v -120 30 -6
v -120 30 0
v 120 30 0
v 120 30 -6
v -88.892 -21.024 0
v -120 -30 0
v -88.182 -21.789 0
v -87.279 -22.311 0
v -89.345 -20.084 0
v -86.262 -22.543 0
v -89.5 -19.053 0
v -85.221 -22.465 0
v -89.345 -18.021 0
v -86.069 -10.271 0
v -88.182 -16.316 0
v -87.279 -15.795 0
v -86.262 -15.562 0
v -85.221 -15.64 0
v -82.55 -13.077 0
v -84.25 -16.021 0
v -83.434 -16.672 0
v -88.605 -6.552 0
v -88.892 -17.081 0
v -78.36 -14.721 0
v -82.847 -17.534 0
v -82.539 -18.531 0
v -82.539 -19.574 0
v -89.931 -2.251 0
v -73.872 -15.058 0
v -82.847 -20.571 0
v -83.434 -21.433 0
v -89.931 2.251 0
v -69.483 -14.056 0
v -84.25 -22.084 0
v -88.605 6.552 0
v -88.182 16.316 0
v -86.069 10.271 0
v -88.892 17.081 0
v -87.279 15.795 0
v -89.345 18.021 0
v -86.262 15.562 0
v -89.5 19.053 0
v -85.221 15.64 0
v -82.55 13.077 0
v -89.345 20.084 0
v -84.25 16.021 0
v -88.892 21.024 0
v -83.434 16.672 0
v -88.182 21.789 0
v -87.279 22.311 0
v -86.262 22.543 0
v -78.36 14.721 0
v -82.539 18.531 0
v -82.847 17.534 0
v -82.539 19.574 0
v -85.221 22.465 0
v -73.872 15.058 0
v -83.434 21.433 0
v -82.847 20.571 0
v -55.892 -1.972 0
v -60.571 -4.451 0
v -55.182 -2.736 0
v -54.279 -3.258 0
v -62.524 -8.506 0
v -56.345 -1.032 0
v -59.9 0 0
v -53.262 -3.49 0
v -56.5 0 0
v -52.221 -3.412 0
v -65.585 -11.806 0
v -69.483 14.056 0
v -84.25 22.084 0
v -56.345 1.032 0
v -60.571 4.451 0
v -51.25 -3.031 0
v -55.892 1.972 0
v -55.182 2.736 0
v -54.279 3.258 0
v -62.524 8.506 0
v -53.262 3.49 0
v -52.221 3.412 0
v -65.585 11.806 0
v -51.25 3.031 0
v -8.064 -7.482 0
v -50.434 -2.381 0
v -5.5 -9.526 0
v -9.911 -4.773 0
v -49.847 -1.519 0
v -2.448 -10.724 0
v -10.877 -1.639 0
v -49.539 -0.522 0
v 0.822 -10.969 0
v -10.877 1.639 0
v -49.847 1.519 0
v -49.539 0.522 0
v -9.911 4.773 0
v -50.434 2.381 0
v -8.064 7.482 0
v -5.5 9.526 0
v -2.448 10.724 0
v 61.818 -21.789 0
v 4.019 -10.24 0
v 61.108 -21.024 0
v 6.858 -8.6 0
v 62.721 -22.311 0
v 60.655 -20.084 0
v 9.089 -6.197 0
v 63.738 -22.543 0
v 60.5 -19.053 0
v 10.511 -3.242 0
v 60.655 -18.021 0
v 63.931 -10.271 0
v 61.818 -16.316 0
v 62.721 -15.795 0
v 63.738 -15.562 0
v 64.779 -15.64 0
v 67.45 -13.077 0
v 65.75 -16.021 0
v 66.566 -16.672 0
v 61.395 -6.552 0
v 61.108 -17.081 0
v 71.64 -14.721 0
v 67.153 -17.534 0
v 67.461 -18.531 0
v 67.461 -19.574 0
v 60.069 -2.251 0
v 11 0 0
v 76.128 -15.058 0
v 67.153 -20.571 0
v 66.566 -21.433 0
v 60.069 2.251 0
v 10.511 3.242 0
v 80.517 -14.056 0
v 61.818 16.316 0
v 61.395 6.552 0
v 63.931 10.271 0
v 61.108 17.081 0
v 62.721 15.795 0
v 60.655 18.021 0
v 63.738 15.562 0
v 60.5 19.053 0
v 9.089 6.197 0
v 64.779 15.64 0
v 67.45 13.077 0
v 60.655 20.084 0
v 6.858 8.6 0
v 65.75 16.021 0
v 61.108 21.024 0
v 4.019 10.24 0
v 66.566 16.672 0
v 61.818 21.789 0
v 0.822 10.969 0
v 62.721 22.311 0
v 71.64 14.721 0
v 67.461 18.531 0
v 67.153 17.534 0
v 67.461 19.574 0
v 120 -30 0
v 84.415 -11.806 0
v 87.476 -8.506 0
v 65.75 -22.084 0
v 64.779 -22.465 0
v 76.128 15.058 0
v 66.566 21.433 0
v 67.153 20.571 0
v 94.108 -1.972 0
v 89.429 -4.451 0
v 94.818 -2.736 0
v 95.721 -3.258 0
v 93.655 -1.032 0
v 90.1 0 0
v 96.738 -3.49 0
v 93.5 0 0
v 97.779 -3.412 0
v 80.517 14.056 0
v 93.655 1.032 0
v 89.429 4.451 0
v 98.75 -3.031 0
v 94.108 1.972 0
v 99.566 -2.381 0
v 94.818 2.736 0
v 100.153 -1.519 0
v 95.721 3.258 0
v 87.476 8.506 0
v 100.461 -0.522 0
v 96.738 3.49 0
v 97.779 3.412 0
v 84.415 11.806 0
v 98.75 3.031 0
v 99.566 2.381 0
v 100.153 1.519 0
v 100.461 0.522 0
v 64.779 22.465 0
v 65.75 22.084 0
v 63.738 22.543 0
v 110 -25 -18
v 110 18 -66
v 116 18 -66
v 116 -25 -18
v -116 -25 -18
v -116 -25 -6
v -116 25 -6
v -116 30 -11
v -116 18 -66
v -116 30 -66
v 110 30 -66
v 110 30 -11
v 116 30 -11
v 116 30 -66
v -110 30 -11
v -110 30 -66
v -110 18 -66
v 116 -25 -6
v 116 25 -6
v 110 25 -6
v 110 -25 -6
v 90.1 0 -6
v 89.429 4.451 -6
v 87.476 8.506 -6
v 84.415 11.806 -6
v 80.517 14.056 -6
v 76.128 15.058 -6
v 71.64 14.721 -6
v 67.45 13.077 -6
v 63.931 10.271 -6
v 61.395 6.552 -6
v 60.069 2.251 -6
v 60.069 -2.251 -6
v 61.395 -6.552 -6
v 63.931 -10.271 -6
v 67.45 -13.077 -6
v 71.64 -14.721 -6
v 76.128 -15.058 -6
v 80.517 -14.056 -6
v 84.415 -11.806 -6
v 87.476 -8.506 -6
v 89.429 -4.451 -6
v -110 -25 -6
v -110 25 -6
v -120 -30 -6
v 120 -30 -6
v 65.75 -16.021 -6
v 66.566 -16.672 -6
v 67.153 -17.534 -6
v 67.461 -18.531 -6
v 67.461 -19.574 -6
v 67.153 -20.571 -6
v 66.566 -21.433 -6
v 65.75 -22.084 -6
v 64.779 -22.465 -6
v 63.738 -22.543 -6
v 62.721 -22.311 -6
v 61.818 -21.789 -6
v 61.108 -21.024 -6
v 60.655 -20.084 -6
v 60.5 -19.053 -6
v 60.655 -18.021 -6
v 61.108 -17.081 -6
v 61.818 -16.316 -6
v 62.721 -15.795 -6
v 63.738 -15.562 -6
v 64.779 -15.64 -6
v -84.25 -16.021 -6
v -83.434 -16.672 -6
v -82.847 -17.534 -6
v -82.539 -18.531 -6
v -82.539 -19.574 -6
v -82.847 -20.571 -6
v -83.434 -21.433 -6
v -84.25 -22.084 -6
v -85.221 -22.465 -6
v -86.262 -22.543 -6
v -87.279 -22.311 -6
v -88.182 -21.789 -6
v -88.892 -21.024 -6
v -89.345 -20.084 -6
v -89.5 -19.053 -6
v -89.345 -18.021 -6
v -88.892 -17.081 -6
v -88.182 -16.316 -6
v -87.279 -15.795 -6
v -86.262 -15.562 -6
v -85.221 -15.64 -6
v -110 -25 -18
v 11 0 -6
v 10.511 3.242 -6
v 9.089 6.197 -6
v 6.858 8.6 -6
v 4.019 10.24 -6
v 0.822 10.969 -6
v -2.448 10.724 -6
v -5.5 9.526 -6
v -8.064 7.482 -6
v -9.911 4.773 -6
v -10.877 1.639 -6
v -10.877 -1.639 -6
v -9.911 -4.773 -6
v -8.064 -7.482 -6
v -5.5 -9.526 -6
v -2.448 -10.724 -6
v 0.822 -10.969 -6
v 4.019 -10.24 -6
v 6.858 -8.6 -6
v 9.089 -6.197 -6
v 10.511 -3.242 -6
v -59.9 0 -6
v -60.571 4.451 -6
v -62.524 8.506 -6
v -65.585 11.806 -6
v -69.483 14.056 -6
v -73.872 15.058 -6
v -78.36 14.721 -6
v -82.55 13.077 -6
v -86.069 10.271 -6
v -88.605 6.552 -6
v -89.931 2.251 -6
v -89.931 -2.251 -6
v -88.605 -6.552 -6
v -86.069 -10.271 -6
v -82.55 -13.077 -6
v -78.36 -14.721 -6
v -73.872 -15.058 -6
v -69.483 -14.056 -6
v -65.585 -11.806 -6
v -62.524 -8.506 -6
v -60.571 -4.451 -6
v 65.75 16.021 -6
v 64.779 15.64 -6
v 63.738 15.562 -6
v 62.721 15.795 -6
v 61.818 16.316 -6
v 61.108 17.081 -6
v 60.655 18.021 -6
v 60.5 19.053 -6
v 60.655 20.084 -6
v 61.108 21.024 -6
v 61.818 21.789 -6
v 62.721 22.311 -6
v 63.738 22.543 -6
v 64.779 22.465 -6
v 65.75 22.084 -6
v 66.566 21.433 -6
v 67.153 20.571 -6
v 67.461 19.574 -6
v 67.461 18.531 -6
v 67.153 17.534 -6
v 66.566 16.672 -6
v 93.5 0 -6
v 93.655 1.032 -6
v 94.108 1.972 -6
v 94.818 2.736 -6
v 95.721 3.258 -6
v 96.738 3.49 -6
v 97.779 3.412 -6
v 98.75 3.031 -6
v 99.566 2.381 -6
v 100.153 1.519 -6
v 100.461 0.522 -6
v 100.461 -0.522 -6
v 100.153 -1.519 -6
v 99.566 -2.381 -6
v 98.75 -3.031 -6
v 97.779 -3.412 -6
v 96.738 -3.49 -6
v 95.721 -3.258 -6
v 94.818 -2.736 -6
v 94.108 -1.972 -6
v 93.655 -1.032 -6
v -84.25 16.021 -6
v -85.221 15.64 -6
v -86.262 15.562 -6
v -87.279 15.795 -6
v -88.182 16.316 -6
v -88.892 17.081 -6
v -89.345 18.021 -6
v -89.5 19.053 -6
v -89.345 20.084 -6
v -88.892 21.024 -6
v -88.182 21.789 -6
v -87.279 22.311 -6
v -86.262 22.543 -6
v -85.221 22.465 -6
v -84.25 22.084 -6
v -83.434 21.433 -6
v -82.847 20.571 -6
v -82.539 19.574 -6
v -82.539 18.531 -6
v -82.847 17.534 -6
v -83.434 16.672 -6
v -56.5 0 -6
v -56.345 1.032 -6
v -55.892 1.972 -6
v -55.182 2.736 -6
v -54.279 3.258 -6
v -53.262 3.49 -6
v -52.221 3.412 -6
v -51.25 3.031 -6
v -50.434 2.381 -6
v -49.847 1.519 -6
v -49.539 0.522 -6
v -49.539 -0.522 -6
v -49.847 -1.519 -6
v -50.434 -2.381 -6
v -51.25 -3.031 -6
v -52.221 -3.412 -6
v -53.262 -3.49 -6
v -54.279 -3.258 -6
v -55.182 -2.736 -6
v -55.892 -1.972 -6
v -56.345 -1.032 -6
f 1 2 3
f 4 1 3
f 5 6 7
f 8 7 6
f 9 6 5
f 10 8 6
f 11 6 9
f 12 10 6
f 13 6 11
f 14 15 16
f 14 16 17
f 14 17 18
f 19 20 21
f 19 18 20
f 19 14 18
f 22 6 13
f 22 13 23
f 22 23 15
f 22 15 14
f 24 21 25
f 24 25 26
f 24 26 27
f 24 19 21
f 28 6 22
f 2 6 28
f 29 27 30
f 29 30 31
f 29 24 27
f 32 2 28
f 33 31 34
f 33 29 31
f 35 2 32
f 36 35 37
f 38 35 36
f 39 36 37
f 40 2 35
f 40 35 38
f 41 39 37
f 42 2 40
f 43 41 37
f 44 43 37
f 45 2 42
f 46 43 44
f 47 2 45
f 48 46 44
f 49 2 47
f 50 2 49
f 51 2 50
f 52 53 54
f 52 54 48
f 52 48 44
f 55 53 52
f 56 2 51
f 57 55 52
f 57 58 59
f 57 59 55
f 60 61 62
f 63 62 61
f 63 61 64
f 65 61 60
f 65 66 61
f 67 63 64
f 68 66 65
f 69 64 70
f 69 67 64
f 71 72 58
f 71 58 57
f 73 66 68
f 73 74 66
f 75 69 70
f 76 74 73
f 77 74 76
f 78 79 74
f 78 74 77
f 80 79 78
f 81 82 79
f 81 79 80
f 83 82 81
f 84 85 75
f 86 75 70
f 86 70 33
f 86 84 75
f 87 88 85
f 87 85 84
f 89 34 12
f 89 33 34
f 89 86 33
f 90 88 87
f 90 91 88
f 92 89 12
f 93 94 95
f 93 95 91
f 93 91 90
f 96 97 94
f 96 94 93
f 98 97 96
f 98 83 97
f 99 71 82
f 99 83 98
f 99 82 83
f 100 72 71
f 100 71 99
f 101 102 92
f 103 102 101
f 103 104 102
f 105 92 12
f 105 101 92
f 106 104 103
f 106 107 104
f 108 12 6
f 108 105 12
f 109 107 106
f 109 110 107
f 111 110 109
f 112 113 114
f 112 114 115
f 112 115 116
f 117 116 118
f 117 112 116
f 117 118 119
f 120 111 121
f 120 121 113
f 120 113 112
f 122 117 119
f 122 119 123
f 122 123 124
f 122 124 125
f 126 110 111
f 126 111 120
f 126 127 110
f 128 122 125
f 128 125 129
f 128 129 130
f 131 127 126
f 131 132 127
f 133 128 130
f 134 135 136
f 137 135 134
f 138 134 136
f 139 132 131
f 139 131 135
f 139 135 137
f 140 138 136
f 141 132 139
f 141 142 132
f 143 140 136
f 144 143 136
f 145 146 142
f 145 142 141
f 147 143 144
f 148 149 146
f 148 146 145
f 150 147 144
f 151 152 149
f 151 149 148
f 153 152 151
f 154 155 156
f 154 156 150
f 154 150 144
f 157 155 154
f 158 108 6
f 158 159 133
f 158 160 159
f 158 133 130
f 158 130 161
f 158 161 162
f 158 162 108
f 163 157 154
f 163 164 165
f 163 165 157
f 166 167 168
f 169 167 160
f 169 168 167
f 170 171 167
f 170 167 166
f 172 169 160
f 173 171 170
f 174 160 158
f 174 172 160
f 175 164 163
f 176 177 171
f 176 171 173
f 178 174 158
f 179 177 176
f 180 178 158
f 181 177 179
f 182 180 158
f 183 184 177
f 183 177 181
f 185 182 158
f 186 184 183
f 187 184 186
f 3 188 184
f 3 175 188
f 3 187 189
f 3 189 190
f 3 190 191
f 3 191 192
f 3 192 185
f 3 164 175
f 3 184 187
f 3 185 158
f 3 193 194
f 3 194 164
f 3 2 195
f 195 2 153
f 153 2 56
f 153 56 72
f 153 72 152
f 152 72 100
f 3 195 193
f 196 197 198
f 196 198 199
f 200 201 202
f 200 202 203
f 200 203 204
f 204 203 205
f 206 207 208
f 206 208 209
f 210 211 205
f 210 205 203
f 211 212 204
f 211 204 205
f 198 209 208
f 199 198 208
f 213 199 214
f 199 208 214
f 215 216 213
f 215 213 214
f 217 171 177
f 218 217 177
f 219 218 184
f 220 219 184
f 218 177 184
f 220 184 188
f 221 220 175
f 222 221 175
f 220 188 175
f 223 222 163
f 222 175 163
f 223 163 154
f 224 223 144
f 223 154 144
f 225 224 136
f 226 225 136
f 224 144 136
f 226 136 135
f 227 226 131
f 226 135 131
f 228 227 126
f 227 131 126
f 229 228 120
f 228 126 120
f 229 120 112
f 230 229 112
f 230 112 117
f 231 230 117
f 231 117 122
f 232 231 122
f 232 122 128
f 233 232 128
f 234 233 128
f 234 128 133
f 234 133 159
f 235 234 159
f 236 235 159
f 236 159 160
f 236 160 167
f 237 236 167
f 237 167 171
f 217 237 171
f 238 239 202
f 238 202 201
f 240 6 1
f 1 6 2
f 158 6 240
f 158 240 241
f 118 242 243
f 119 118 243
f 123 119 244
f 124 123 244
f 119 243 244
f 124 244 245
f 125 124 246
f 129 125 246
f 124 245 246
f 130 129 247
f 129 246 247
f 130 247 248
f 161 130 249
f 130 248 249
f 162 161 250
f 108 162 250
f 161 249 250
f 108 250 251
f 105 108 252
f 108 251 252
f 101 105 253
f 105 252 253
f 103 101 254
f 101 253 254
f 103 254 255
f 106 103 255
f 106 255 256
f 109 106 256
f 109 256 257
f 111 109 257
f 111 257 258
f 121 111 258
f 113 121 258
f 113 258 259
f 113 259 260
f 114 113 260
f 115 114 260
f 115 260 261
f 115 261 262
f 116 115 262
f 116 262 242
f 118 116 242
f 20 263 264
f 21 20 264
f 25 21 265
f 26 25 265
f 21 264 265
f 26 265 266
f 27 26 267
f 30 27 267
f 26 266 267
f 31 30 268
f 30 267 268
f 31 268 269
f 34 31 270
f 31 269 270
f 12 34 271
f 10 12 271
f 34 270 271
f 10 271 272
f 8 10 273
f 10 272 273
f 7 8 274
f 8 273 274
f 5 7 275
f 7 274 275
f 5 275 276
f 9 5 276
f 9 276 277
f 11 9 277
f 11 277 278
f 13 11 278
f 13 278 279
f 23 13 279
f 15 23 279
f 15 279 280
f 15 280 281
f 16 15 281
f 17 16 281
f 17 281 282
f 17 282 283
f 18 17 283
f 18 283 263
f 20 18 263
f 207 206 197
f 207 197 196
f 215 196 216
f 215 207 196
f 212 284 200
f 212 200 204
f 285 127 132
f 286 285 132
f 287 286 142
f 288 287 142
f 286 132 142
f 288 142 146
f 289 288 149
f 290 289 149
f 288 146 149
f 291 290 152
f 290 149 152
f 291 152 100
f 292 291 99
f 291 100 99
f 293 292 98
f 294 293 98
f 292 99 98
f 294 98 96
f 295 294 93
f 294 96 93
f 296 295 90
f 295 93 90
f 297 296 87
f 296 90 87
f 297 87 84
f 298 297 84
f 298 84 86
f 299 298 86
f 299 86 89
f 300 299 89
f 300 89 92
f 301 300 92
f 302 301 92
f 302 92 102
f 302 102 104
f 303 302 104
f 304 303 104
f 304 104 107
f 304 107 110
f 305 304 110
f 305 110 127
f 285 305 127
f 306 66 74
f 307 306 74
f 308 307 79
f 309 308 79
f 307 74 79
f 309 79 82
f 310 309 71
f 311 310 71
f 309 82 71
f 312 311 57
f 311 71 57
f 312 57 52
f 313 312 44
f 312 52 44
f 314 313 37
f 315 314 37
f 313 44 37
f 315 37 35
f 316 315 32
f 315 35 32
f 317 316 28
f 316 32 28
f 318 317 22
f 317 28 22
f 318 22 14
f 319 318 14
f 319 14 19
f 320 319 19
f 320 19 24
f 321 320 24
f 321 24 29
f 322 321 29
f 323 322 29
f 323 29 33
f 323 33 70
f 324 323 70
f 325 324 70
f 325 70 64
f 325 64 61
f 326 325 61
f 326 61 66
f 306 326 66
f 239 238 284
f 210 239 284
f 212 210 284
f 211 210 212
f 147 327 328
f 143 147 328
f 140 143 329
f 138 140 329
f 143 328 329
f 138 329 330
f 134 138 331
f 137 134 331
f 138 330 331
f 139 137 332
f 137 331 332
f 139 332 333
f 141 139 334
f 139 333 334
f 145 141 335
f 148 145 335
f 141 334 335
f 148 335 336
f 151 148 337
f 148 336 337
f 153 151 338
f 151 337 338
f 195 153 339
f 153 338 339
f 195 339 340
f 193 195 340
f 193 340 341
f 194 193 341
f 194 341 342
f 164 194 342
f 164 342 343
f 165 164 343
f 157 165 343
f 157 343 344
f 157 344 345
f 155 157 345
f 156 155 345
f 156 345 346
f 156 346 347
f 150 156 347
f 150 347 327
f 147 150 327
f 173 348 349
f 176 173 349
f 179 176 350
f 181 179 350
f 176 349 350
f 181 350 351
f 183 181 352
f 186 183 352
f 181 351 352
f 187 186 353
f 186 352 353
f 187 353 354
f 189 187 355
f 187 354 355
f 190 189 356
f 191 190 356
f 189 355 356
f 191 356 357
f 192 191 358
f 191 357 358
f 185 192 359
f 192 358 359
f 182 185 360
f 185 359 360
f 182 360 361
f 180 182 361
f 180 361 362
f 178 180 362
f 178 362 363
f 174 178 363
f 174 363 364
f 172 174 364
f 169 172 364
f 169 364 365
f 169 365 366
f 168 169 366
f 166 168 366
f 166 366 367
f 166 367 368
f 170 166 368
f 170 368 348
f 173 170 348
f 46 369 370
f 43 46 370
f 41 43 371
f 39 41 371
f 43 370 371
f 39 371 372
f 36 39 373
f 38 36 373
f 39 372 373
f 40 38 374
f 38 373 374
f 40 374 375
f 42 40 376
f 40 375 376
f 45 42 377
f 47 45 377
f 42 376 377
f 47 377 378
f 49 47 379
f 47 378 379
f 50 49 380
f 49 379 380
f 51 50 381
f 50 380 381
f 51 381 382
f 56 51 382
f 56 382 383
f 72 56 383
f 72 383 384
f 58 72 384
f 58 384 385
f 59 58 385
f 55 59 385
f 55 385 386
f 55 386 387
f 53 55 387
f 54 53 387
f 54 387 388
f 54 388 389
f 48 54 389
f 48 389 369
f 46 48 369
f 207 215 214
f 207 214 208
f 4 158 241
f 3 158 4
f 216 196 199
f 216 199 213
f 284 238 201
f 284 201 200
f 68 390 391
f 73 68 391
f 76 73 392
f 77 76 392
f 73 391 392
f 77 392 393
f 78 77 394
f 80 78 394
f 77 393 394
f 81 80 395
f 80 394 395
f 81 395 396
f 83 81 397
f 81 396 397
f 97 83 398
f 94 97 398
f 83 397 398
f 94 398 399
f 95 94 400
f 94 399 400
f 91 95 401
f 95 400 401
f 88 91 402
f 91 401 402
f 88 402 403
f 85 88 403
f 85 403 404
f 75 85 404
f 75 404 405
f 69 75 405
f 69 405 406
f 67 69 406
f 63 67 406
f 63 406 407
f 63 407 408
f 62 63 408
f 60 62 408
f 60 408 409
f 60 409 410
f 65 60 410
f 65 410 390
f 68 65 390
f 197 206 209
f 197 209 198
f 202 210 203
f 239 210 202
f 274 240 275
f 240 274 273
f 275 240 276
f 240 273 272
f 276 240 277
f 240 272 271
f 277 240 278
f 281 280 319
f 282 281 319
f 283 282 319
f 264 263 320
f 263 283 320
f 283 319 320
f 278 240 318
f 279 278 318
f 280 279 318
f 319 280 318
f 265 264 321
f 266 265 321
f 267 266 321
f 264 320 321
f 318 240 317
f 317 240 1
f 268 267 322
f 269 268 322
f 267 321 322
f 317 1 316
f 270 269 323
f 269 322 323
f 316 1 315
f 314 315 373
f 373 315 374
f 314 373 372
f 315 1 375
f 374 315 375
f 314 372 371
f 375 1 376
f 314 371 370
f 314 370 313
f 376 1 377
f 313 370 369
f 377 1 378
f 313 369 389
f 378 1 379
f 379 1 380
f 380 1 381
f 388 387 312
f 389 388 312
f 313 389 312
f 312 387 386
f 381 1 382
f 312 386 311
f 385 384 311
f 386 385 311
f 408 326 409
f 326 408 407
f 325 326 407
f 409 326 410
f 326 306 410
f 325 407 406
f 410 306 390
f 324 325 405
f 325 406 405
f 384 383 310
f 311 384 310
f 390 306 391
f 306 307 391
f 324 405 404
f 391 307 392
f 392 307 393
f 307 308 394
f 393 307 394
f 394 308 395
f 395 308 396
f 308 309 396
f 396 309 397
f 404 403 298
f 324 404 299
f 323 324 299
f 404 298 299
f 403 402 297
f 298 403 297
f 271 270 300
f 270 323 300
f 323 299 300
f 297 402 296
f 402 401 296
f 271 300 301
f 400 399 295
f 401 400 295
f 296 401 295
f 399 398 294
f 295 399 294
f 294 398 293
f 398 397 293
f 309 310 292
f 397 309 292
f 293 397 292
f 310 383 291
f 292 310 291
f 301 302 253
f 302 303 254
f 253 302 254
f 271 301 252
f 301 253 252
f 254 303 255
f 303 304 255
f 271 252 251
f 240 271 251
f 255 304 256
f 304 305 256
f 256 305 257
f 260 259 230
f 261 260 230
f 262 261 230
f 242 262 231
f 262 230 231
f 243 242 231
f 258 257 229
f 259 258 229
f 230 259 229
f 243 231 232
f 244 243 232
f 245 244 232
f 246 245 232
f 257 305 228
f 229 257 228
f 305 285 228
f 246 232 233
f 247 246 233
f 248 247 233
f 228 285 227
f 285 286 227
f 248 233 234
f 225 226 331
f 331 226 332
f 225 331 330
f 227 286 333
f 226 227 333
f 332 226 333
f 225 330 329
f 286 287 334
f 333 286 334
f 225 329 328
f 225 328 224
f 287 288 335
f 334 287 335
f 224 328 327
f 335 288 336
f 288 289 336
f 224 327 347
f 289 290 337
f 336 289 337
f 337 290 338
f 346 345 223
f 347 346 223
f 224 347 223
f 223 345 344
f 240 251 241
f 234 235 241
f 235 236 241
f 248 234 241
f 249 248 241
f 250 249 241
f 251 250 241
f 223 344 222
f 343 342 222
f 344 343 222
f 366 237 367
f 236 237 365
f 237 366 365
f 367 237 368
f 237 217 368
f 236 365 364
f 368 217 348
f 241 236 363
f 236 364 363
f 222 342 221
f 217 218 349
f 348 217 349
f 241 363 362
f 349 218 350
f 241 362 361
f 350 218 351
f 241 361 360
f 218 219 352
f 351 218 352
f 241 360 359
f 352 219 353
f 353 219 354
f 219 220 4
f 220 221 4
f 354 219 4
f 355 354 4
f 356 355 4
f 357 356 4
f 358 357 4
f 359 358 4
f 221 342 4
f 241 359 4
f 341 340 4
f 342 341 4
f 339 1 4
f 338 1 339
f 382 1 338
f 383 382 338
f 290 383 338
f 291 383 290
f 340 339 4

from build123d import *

# Parameters (mm, degrees)
SKETCH1_W          = 240
SKETCH1_H          = 60
BASE_FLANGE1_DEPTH = 6
BASE_FLANGE2_DEPTH = 6
BASE_FLANGE3_DEPTH = 6
SKETCH12_R         = 11
CUT_EXTRUDE1_DEPTH = 141.199857347
SKETCH13_R         = 15.1
CUT_EXTRUDE2_DEPTH = 141.199857347
SKETCH14_R         = 3.5
CUT_EXTRUDE3_DEPTH = 138.477270849
CIRPATTERN1_COUNT  = 3
SKETCH15_R         = 3.5
CUT_EXTRUDE4_DEPTH = 138.477270849
CIRPATTERN2_COUNT  = 3


# Sheet-metal steps are written as plain solids
with BuildPart() as part:
    # Sketch1 → Base-Flange1 (new body)
    with BuildSketch(Plane.XY):
        Rectangle(SKETCH1_W, SKETCH1_H)
    extrude(amount=-BASE_FLANGE1_DEPTH)

    # Sketch12 → Cut-Extrude1 (cut, through all)
    with BuildSketch(Plane.XY):
        Circle(SKETCH12_R)
    extrude(amount=-CUT_EXTRUDE1_DEPTH, mode=Mode.SUBTRACT)

    # Sketch13 → Cut-Extrude2 (cut, through all)
    with BuildSketch(Plane.XY):
        with Locations((-75, 0)):
            Circle(SKETCH13_R)
        with Locations((75, 0)):
            Circle(SKETCH13_R)
    extrude(amount=-CUT_EXTRUDE2_DEPTH, mode=Mode.SUBTRACT)

    # Sketch14 → Cut-Extrude3 (cut, through all)
    with BuildSketch(Plane(origin=(0, 0, -6), x_dir=(-1, 0, 0), z_dir=(0, 0, -1))):
        with Locations((-97, 0)):
            Circle(SKETCH14_R)
    cut_extrude3 = extrude(amount=-CUT_EXTRUDE3_DEPTH, mode=Mode.SUBTRACT)

    # CirPattern1: Cut-Extrude3 ×3 about axis
    cirpattern1_axis = Axis((75, 0, 0), (0, 0, 1))
    for i in range(1, CIRPATTERN1_COUNT):
        add(cut_extrude3.rotate(cirpattern1_axis, i * 360 / CIRPATTERN1_COUNT), mode=Mode.SUBTRACT)

    # Sketch15 → Cut-Extrude4 (cut, through all)
    with BuildSketch(Plane(origin=(0, 0, -6), x_dir=(-1, 0, 0), z_dir=(0, 0, -1))):
        with Locations((53, 0)):
            Circle(SKETCH15_R)
    cut_extrude4 = extrude(amount=-CUT_EXTRUDE4_DEPTH, mode=Mode.SUBTRACT)

    # CirPattern2: Cut-Extrude4 ×3 about axis
    cirpattern2_axis = Axis((-75, 0, 0), (0, 0, 1))
    for i in range(1, CIRPATTERN2_COUNT):
        add(cut_extrude4.rotate(cirpattern2_axis, i * 360 / CIRPATTERN2_COUNT), mode=Mode.SUBTRACT)


with BuildPart() as body_2:
    # Sketch6 → Base-Flange2 (new body)
    with BuildSketch(Plane(origin=(110, 0, 0), x_dir=(0, 0, -1), z_dir=(1, 0, 0))):
        Polygon((11, 30), (66, 30), (66, 18), (18, -25), (6, -25), (6, 25), align=None)
    extrude(amount=BASE_FLANGE2_DEPTH)


with BuildPart() as body_3:
    # Sketch9 → Base-Flange3 (new body)
    with BuildSketch(Plane(origin=(-110, 0, 0), x_dir=(0, 0, -1), z_dir=(1, 0, 0))):
        Polygon((66, 30), (11, 30), (6, 25), (6, -25), (18, -25), (66, 18), align=None)
    extrude(amount=-BASE_FLANGE3_DEPTH)


solid = Compound([part.part, body_2.part, body_3.part])
